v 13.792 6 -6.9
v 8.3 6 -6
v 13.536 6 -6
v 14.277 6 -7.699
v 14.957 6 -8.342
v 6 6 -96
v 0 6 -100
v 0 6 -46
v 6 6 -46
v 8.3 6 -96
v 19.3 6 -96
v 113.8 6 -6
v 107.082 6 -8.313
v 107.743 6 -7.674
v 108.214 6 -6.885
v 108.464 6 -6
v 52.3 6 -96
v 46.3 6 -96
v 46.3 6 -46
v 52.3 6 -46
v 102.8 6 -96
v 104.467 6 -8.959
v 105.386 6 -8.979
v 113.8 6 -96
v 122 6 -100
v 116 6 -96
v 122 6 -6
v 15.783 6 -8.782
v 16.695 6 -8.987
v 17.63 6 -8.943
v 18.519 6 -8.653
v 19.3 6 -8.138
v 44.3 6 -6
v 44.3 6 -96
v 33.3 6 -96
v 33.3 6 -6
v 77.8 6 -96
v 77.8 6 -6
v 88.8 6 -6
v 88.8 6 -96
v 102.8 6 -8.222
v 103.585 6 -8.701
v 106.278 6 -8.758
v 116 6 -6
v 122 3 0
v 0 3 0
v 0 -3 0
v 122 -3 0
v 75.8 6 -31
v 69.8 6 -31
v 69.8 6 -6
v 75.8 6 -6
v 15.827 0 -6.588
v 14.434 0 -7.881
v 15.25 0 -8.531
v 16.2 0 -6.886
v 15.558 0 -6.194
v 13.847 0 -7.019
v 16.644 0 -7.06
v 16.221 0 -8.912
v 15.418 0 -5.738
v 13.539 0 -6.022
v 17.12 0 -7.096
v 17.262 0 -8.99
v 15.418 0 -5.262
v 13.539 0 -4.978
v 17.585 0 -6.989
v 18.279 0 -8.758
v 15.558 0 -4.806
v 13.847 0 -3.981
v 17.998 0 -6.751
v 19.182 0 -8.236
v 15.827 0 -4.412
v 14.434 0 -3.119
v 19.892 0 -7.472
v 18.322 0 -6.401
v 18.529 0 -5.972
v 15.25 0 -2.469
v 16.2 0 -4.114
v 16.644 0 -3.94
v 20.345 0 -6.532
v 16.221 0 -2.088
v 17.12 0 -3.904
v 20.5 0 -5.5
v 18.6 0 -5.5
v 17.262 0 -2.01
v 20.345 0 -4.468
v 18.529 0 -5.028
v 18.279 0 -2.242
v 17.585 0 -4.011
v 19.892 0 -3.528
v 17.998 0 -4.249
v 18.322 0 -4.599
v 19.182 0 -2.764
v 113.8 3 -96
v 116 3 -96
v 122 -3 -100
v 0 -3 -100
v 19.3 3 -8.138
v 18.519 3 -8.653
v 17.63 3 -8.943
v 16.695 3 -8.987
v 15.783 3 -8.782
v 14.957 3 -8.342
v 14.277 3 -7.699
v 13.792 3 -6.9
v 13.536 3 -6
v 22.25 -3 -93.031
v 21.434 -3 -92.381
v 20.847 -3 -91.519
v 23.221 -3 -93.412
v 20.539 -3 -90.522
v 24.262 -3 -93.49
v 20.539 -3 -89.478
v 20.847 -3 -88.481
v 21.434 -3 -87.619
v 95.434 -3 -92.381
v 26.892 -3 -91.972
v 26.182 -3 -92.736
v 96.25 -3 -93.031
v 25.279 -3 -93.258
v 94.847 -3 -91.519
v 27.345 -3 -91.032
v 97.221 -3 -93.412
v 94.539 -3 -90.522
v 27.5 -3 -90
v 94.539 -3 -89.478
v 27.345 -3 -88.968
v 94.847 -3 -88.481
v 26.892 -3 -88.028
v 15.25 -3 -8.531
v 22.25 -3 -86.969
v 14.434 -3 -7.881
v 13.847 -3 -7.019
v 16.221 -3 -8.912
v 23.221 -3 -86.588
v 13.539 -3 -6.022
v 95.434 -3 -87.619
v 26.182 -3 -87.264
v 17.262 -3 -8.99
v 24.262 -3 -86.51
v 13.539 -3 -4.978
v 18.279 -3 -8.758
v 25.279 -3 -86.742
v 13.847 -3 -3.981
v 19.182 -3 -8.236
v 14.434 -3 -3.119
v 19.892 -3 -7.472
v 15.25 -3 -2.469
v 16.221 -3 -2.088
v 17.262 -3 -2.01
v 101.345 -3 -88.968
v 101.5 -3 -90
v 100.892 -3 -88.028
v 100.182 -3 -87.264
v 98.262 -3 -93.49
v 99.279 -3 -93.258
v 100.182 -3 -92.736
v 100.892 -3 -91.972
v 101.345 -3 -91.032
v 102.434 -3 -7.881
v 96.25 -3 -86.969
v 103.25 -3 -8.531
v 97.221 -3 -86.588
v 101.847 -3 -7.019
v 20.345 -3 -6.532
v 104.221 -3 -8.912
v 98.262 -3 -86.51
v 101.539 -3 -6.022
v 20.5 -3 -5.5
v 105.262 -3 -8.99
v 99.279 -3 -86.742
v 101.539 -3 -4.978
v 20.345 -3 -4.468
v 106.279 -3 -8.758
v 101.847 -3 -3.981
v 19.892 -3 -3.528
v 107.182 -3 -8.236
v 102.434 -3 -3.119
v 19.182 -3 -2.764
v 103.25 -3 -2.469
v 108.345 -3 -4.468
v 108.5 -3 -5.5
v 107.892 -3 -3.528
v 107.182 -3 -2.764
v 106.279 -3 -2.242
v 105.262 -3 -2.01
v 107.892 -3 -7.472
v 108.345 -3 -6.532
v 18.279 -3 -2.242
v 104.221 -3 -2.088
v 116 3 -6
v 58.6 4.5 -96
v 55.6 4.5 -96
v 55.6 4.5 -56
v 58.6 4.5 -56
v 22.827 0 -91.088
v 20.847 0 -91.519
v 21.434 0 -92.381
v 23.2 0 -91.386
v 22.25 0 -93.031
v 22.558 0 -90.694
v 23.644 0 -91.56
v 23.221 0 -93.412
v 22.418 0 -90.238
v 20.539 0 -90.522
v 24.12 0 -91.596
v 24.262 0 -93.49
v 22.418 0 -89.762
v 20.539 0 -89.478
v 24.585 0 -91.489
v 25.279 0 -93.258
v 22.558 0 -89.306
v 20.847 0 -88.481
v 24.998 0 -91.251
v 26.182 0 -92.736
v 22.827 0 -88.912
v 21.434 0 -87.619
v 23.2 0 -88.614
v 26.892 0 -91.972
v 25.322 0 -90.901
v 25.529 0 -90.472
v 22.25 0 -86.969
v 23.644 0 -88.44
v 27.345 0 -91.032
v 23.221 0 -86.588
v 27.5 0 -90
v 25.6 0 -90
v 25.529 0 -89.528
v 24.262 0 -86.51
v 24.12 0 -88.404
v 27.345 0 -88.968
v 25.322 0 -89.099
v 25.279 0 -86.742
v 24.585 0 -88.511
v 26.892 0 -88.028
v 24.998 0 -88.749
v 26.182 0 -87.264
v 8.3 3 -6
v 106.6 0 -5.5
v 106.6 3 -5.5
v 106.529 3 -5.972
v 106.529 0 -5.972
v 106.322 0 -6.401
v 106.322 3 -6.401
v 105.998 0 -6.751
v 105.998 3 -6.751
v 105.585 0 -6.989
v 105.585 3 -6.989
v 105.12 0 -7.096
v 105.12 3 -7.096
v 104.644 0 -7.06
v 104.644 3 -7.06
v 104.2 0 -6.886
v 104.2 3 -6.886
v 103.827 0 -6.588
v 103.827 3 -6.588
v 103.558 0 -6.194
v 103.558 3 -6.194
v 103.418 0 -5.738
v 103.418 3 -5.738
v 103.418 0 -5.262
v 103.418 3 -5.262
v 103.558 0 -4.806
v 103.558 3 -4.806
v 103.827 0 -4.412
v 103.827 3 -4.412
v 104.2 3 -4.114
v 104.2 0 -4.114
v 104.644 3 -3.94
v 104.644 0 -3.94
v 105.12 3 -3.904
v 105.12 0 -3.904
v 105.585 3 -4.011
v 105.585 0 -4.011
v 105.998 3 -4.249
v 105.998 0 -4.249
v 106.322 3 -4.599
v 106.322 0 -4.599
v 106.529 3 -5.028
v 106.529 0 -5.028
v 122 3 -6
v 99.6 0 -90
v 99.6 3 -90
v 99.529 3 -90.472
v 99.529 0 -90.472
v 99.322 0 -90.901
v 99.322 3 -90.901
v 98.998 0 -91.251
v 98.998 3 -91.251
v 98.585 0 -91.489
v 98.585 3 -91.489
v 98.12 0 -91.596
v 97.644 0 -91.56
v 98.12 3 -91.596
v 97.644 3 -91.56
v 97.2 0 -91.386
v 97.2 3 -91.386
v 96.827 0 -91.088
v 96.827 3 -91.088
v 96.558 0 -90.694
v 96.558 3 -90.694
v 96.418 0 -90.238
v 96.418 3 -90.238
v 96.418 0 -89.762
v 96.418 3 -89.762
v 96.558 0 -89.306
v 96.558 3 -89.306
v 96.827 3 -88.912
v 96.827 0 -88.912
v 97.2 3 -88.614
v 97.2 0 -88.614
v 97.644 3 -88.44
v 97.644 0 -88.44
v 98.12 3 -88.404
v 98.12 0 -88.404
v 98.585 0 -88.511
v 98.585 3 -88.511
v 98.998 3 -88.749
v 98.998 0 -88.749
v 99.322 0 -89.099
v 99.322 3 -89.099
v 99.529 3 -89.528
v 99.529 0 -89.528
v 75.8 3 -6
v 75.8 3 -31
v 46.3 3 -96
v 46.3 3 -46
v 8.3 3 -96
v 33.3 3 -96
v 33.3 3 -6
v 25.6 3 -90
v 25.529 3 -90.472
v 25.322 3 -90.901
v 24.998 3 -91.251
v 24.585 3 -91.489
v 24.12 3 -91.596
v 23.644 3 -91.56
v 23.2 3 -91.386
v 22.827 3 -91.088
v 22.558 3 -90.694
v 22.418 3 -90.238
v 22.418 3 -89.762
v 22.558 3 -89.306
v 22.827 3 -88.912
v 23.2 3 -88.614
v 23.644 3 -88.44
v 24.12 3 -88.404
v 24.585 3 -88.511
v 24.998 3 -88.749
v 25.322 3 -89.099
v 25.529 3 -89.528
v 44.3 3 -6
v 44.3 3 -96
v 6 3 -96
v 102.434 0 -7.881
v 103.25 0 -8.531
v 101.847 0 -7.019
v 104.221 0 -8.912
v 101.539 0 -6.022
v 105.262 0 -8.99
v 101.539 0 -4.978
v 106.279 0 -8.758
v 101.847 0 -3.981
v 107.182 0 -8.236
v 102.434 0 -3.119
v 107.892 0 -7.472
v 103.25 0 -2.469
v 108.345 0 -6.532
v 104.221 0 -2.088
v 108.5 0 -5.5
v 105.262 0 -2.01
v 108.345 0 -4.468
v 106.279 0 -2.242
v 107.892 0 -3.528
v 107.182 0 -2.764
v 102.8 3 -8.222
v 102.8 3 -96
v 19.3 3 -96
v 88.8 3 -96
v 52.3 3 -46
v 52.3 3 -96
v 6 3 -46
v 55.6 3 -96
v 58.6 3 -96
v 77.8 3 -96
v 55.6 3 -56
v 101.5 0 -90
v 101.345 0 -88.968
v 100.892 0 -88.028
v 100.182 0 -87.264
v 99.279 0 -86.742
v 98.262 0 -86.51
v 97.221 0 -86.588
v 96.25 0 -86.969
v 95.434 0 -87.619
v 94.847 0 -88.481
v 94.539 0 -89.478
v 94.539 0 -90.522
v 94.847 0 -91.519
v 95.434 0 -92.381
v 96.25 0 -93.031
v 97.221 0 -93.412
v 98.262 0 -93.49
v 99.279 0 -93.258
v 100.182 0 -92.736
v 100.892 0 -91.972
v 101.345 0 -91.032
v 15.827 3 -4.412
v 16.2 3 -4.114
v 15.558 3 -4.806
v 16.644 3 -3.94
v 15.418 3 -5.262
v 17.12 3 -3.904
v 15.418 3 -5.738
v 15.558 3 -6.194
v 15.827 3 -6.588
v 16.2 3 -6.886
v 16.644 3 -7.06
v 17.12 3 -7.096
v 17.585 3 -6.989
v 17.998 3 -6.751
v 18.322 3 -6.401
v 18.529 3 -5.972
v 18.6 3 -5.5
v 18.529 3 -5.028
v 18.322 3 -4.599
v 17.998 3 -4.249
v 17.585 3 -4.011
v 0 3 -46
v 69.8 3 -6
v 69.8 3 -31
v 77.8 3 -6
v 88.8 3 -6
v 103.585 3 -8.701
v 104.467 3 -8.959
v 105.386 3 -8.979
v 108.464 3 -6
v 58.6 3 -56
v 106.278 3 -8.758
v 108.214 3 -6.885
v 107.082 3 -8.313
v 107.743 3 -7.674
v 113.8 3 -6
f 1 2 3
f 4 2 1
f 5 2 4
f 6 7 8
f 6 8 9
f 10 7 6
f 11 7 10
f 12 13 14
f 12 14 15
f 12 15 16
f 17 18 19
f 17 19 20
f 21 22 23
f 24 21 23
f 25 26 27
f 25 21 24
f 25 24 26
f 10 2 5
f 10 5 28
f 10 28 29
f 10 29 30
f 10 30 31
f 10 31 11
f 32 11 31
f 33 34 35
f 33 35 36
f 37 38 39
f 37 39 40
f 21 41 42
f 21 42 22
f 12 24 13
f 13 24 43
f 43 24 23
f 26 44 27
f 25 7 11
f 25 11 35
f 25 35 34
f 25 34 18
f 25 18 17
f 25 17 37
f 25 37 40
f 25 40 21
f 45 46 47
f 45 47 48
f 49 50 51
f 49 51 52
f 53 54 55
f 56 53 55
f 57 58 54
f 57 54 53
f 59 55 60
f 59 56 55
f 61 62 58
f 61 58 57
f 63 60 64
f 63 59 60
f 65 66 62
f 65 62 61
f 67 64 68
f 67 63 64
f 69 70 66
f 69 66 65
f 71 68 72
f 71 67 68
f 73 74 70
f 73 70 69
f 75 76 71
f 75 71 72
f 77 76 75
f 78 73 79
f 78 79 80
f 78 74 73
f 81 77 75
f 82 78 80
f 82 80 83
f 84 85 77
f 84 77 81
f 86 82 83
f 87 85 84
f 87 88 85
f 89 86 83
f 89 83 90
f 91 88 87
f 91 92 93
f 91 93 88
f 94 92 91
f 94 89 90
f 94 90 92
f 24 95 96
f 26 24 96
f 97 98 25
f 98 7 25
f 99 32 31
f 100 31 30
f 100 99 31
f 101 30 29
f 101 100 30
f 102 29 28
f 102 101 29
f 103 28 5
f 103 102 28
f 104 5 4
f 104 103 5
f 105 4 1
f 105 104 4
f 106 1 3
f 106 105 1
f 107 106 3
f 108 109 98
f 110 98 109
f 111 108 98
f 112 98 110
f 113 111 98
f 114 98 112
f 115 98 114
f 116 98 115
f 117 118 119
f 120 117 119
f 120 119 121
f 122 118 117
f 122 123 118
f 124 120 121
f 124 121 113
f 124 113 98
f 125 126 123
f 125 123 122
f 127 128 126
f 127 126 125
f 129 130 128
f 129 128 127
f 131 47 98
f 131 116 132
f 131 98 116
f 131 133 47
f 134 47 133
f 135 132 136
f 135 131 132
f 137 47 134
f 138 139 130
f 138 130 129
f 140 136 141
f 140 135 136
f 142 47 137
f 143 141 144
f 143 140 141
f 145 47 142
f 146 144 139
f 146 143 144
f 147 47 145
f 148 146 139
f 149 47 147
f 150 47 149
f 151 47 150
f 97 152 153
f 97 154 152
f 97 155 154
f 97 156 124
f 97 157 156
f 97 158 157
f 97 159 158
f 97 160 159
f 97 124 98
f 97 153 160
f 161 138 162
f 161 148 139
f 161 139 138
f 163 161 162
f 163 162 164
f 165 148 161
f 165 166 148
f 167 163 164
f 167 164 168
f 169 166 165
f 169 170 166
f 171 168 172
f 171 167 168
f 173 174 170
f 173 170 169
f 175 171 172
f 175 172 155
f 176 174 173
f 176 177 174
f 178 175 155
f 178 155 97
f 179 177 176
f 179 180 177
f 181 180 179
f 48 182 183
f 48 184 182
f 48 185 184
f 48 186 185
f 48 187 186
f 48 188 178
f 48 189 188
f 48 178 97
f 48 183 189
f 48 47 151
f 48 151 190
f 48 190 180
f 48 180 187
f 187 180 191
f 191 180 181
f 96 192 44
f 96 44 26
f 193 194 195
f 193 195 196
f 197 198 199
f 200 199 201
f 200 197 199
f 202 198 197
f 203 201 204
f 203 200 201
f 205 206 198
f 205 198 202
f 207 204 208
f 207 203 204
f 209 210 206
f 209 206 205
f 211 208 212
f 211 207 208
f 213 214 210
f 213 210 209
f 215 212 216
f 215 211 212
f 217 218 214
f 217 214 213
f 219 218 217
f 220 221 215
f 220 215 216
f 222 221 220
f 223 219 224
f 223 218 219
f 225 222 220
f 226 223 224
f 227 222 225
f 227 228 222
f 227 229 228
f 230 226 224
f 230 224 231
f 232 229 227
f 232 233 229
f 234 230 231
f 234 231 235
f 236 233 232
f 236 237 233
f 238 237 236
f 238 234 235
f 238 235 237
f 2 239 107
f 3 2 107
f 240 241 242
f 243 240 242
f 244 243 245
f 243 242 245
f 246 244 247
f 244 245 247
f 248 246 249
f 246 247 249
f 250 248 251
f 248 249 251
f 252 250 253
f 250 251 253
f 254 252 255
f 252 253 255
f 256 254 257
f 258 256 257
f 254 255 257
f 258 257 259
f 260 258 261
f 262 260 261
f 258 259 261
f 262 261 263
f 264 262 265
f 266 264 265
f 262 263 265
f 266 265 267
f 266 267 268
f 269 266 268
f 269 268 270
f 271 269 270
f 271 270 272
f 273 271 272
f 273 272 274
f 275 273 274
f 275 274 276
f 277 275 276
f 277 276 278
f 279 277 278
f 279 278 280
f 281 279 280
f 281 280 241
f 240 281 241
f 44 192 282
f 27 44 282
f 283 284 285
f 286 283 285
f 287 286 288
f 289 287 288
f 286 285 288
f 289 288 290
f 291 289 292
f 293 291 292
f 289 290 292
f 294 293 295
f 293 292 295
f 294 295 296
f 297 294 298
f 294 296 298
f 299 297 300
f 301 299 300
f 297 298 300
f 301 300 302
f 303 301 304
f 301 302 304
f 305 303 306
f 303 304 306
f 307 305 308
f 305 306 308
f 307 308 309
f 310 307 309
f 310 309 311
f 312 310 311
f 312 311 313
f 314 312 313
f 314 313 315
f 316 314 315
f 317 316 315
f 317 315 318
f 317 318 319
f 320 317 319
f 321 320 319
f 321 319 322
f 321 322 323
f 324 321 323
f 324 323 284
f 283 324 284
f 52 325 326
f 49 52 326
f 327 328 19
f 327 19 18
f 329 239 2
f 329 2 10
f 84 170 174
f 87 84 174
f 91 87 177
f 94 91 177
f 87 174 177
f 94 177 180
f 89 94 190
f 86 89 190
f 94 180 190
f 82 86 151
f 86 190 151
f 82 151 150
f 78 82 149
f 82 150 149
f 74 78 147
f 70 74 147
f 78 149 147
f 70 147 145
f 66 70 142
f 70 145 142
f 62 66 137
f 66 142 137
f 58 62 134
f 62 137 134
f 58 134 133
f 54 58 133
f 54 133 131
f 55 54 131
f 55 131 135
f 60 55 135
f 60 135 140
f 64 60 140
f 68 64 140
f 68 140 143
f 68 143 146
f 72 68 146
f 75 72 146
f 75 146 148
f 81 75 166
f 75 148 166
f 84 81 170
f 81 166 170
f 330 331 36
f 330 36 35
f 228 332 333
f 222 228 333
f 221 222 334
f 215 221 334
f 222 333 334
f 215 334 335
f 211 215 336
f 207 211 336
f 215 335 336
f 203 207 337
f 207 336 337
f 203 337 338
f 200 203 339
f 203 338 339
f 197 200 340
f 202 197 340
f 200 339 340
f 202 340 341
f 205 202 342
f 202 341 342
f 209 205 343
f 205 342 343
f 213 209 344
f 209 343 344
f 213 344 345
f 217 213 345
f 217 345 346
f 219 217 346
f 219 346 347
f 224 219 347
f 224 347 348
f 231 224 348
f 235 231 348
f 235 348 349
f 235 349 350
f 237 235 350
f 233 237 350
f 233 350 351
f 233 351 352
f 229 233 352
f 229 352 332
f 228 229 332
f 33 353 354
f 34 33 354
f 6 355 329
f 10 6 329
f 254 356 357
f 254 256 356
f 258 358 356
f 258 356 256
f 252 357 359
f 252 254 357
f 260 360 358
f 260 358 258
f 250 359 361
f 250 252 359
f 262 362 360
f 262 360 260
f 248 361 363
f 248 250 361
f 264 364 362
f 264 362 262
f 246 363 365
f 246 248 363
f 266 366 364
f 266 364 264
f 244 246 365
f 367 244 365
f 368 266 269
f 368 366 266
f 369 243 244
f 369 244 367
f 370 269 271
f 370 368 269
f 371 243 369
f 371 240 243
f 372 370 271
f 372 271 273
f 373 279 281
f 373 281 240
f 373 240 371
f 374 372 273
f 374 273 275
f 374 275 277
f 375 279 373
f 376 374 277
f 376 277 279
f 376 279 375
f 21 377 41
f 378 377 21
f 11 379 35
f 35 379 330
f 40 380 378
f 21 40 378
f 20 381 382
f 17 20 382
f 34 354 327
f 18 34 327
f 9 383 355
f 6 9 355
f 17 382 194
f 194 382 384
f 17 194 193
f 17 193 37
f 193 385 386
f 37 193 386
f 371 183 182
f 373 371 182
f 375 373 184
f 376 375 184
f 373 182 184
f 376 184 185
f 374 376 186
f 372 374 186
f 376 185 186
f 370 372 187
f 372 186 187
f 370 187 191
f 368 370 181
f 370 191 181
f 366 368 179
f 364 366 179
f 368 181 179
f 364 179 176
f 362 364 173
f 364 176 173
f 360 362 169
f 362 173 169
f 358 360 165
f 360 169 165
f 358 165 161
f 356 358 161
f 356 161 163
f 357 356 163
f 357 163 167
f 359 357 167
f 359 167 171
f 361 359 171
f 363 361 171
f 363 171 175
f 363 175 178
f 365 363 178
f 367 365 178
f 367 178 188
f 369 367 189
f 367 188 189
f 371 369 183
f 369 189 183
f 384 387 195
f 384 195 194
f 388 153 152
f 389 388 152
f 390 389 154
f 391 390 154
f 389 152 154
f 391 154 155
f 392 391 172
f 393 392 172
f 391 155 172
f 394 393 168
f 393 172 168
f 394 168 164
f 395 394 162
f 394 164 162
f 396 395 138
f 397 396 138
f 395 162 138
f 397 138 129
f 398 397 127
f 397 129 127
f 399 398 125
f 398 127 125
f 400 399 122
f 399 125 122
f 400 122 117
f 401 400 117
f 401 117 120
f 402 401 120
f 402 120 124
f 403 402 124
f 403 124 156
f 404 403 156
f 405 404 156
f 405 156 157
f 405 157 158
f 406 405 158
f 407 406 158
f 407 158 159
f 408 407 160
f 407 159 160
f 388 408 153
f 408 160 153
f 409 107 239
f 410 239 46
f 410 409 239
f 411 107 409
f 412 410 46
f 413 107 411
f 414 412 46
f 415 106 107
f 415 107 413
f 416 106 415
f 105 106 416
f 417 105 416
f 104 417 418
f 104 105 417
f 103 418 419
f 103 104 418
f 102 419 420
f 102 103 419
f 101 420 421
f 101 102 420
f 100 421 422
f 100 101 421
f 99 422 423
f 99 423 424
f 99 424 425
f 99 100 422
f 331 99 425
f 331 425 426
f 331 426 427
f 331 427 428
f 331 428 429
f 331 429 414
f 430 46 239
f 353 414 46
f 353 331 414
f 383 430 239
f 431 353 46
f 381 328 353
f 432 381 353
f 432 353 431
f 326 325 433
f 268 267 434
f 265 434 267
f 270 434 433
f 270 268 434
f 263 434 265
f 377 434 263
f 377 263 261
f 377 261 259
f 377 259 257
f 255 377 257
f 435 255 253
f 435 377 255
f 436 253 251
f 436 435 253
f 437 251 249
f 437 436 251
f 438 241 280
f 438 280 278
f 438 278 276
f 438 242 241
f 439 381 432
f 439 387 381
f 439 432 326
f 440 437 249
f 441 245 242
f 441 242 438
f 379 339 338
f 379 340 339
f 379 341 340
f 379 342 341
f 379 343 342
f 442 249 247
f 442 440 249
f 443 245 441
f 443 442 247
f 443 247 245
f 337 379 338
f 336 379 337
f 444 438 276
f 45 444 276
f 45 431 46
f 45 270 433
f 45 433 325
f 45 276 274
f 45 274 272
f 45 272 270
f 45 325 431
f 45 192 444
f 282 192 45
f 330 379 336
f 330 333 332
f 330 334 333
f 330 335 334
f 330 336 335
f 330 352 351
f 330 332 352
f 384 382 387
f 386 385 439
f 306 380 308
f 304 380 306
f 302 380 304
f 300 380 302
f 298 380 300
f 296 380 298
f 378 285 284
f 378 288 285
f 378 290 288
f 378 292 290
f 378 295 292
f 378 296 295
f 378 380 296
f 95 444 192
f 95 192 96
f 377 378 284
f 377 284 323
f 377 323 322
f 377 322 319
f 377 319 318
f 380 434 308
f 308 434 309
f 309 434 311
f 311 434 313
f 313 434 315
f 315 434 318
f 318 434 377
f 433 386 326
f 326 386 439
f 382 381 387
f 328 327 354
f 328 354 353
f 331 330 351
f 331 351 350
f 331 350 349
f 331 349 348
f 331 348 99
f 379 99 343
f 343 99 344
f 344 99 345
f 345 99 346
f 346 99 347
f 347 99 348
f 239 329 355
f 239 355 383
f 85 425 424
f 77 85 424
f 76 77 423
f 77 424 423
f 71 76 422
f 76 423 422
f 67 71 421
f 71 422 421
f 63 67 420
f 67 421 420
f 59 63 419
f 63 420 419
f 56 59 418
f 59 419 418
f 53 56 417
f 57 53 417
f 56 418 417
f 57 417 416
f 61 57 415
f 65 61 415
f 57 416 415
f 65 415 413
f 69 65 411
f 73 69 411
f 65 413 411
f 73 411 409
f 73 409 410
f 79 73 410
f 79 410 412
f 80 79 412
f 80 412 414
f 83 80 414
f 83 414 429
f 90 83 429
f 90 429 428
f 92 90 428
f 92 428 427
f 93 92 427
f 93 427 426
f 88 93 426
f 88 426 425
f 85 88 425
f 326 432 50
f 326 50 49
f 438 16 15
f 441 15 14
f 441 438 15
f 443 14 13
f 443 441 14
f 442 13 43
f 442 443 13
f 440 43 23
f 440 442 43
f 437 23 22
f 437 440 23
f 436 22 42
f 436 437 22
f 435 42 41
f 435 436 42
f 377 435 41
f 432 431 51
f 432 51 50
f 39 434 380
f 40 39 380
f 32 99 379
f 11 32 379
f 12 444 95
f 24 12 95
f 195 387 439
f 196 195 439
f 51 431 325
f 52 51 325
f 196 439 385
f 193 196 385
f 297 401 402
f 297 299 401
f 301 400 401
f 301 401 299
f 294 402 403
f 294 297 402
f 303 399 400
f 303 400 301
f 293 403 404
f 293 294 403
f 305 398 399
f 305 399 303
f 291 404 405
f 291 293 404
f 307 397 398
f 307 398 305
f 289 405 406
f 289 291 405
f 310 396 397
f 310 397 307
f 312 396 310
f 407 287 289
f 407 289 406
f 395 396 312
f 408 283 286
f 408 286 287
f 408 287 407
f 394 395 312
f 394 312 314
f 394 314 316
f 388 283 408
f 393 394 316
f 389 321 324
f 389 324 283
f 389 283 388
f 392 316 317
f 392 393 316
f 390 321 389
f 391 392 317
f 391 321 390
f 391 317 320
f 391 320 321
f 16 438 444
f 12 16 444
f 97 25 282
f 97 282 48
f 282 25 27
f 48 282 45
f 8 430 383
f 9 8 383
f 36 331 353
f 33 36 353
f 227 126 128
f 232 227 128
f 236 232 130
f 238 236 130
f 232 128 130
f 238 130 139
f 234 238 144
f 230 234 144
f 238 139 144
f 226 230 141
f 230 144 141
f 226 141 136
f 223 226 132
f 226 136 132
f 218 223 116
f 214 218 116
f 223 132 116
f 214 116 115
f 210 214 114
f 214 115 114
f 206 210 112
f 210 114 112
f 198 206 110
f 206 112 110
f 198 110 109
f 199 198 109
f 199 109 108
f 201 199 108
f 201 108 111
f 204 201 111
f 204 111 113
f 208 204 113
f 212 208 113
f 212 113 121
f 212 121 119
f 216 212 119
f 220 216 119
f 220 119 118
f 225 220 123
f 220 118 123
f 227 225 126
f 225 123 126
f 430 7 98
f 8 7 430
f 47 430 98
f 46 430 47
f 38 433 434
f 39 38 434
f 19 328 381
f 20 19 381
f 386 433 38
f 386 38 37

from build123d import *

# Parameters (mm, degrees)
SKETCH1_W                   = 122
SKETCH1_H                   = 100
BOSS_EXTRUDE1_DEPTH         = 3
SKETCH2_W                   = 6
SKETCH2_H                   = 50
SKETCH2_W_2                 = 11
SKETCH2_H_2                 = 90
SKETCH2_H_3                 = 25
BOSS_EXTRUDE2_DEPTH         = 3
SKETCH3_W                   = 3
SKETCH3_H                   = 40
BOSS_EXTRUDE3_DEPTH         = 1.5
SKETCH4_W                   = 122
SKETCH4_H                   = 4
BOSS_EXTRUDE4_DEPTH         = 3
SKETCH7_W                   = 122
SKETCH7_H                   = 100
BOSS_EXTRUDE5_DEPTH         = 3
SKETCH5_R                   = 1.6
STANDOFF_HOLE_DEPTH         = 4
STANDOFF_HOLE_DEPTH_BACK    = 7
SKETCH6_R                   = 3.5
CLEARANCE_HOLE_TOP_DEPTH    = 4
SKETCH8_R                   = 3.5
CLEARANCE_HOLE_BOTTOM_DEPTH = 3


with BuildPart() as part:
    # Sketch1 → Boss-Extrude1 (new body)
    with BuildSketch(Plane(origin=(0, 0, 0), x_dir=(1, 0, 0), z_dir=(0, 1, 0))):
        with Locations((61, 50)):
            Rectangle(SKETCH1_W, SKETCH1_H)
    extrude(amount=BOSS_EXTRUDE1_DEPTH)

    # Sketch2 → Boss-Extrude2 (add)
    with BuildSketch(Plane(origin=(0, 3, 0), x_dir=(1, 0, 0), z_dir=(0, 1, 0))):
        with Locations((3, 71)):
            Rectangle(SKETCH2_W, SKETCH2_H)
        with Locations((13.8, 51)):
            Rectangle(SKETCH2_W_2, SKETCH2_H_2)
        with Locations((38.8, 51)):
            Rectangle(SKETCH2_W_2, SKETCH2_H_2)
        with Locations((49.3, 71)):
            Rectangle(SKETCH2_W, SKETCH2_H)
        with Locations((72.8, 18.5)):
            Rectangle(SKETCH2_W, SKETCH2_H_3)
        with Locations((83.3, 51)):
            Rectangle(SKETCH2_W_2, SKETCH2_H_2)
        with Locations((108.3, 51)):
            Rectangle(SKETCH2_W_2, SKETCH2_H_2)
        with Locations((119, 51)):
            Rectangle(SKETCH2_W, SKETCH2_H_2)
    extrude(amount=BOSS_EXTRUDE2_DEPTH)

    # Sketch3 → Boss-Extrude3 (add)
    with BuildSketch(Plane(origin=(0, 3, 0), x_dir=(1, 0, 0), z_dir=(0, 1, 0))):
        with Locations((57.1, 76)):
            Rectangle(SKETCH3_W, SKETCH3_H)
    extrude(amount=BOSS_EXTRUDE3_DEPTH)

    # Sketch4 → Boss-Extrude4 (add)
    with BuildSketch(Plane(origin=(0, 3, 0), x_dir=(1, 0, 0), z_dir=(0, 1, 0))):
        with Locations((61, 98)):
            Rectangle(SKETCH4_W, SKETCH4_H)
    extrude(amount=BOSS_EXTRUDE4_DEPTH)

    # Sketch7 → Boss-Extrude5 (add)
    with BuildSketch(Plane.XZ):
        with Locations((61, -50)):
            Rectangle(SKETCH7_W, SKETCH7_H)
    extrude(amount=BOSS_EXTRUDE5_DEPTH)

    # Sketch5 → standoff hole (cut, two sides)
    with BuildSketch(Plane(origin=(0, 3, 0), x_dir=(1, 0, 0), z_dir=(0, 1, 0))) as standoff_hole_sk:
        with Locations((17, 5.5)):
            Circle(SKETCH5_R)
        with Locations((105, 5.5)):
            Circle(SKETCH5_R)
        with Locations((24, 90)):
            Circle(SKETCH5_R)
        with Locations((98, 90)):
            Circle(SKETCH5_R)
    extrude(amount=STANDOFF_HOLE_DEPTH, mode=Mode.SUBTRACT)
    extrude(standoff_hole_sk.sketch, amount=-STANDOFF_HOLE_DEPTH_BACK, mode=Mode.SUBTRACT)

    # Sketch6 → clearance hole top (cut, through all)
    with BuildSketch(Plane(origin=(0, 3, 0), x_dir=(1, 0, 0), z_dir=(0, 1, 0))):
        with Locations((17, 5.5)):
            Circle(SKETCH6_R)
        with Locations((105, 5.5)):
            Circle(SKETCH6_R)
    extrude(amount=CLEARANCE_HOLE_TOP_DEPTH, mode=Mode.SUBTRACT)

    # Sketch8 → clearance hole bottom (cut)
    with BuildSketch(Plane.XZ.offset(3)):
        with Locations((17, -5.5)):
            Circle(SKETCH8_R)
        with Locations((105, -5.5)):
            Circle(SKETCH8_R)
        with Locations((98, -90)):
            Circle(SKETCH8_R)
        with Locations((24, -90)):
            Circle(SKETCH8_R)
    extrude(amount=-CLEARANCE_HOLE_BOTTOM_DEPTH, mode=Mode.SUBTRACT)


solid = part.part
